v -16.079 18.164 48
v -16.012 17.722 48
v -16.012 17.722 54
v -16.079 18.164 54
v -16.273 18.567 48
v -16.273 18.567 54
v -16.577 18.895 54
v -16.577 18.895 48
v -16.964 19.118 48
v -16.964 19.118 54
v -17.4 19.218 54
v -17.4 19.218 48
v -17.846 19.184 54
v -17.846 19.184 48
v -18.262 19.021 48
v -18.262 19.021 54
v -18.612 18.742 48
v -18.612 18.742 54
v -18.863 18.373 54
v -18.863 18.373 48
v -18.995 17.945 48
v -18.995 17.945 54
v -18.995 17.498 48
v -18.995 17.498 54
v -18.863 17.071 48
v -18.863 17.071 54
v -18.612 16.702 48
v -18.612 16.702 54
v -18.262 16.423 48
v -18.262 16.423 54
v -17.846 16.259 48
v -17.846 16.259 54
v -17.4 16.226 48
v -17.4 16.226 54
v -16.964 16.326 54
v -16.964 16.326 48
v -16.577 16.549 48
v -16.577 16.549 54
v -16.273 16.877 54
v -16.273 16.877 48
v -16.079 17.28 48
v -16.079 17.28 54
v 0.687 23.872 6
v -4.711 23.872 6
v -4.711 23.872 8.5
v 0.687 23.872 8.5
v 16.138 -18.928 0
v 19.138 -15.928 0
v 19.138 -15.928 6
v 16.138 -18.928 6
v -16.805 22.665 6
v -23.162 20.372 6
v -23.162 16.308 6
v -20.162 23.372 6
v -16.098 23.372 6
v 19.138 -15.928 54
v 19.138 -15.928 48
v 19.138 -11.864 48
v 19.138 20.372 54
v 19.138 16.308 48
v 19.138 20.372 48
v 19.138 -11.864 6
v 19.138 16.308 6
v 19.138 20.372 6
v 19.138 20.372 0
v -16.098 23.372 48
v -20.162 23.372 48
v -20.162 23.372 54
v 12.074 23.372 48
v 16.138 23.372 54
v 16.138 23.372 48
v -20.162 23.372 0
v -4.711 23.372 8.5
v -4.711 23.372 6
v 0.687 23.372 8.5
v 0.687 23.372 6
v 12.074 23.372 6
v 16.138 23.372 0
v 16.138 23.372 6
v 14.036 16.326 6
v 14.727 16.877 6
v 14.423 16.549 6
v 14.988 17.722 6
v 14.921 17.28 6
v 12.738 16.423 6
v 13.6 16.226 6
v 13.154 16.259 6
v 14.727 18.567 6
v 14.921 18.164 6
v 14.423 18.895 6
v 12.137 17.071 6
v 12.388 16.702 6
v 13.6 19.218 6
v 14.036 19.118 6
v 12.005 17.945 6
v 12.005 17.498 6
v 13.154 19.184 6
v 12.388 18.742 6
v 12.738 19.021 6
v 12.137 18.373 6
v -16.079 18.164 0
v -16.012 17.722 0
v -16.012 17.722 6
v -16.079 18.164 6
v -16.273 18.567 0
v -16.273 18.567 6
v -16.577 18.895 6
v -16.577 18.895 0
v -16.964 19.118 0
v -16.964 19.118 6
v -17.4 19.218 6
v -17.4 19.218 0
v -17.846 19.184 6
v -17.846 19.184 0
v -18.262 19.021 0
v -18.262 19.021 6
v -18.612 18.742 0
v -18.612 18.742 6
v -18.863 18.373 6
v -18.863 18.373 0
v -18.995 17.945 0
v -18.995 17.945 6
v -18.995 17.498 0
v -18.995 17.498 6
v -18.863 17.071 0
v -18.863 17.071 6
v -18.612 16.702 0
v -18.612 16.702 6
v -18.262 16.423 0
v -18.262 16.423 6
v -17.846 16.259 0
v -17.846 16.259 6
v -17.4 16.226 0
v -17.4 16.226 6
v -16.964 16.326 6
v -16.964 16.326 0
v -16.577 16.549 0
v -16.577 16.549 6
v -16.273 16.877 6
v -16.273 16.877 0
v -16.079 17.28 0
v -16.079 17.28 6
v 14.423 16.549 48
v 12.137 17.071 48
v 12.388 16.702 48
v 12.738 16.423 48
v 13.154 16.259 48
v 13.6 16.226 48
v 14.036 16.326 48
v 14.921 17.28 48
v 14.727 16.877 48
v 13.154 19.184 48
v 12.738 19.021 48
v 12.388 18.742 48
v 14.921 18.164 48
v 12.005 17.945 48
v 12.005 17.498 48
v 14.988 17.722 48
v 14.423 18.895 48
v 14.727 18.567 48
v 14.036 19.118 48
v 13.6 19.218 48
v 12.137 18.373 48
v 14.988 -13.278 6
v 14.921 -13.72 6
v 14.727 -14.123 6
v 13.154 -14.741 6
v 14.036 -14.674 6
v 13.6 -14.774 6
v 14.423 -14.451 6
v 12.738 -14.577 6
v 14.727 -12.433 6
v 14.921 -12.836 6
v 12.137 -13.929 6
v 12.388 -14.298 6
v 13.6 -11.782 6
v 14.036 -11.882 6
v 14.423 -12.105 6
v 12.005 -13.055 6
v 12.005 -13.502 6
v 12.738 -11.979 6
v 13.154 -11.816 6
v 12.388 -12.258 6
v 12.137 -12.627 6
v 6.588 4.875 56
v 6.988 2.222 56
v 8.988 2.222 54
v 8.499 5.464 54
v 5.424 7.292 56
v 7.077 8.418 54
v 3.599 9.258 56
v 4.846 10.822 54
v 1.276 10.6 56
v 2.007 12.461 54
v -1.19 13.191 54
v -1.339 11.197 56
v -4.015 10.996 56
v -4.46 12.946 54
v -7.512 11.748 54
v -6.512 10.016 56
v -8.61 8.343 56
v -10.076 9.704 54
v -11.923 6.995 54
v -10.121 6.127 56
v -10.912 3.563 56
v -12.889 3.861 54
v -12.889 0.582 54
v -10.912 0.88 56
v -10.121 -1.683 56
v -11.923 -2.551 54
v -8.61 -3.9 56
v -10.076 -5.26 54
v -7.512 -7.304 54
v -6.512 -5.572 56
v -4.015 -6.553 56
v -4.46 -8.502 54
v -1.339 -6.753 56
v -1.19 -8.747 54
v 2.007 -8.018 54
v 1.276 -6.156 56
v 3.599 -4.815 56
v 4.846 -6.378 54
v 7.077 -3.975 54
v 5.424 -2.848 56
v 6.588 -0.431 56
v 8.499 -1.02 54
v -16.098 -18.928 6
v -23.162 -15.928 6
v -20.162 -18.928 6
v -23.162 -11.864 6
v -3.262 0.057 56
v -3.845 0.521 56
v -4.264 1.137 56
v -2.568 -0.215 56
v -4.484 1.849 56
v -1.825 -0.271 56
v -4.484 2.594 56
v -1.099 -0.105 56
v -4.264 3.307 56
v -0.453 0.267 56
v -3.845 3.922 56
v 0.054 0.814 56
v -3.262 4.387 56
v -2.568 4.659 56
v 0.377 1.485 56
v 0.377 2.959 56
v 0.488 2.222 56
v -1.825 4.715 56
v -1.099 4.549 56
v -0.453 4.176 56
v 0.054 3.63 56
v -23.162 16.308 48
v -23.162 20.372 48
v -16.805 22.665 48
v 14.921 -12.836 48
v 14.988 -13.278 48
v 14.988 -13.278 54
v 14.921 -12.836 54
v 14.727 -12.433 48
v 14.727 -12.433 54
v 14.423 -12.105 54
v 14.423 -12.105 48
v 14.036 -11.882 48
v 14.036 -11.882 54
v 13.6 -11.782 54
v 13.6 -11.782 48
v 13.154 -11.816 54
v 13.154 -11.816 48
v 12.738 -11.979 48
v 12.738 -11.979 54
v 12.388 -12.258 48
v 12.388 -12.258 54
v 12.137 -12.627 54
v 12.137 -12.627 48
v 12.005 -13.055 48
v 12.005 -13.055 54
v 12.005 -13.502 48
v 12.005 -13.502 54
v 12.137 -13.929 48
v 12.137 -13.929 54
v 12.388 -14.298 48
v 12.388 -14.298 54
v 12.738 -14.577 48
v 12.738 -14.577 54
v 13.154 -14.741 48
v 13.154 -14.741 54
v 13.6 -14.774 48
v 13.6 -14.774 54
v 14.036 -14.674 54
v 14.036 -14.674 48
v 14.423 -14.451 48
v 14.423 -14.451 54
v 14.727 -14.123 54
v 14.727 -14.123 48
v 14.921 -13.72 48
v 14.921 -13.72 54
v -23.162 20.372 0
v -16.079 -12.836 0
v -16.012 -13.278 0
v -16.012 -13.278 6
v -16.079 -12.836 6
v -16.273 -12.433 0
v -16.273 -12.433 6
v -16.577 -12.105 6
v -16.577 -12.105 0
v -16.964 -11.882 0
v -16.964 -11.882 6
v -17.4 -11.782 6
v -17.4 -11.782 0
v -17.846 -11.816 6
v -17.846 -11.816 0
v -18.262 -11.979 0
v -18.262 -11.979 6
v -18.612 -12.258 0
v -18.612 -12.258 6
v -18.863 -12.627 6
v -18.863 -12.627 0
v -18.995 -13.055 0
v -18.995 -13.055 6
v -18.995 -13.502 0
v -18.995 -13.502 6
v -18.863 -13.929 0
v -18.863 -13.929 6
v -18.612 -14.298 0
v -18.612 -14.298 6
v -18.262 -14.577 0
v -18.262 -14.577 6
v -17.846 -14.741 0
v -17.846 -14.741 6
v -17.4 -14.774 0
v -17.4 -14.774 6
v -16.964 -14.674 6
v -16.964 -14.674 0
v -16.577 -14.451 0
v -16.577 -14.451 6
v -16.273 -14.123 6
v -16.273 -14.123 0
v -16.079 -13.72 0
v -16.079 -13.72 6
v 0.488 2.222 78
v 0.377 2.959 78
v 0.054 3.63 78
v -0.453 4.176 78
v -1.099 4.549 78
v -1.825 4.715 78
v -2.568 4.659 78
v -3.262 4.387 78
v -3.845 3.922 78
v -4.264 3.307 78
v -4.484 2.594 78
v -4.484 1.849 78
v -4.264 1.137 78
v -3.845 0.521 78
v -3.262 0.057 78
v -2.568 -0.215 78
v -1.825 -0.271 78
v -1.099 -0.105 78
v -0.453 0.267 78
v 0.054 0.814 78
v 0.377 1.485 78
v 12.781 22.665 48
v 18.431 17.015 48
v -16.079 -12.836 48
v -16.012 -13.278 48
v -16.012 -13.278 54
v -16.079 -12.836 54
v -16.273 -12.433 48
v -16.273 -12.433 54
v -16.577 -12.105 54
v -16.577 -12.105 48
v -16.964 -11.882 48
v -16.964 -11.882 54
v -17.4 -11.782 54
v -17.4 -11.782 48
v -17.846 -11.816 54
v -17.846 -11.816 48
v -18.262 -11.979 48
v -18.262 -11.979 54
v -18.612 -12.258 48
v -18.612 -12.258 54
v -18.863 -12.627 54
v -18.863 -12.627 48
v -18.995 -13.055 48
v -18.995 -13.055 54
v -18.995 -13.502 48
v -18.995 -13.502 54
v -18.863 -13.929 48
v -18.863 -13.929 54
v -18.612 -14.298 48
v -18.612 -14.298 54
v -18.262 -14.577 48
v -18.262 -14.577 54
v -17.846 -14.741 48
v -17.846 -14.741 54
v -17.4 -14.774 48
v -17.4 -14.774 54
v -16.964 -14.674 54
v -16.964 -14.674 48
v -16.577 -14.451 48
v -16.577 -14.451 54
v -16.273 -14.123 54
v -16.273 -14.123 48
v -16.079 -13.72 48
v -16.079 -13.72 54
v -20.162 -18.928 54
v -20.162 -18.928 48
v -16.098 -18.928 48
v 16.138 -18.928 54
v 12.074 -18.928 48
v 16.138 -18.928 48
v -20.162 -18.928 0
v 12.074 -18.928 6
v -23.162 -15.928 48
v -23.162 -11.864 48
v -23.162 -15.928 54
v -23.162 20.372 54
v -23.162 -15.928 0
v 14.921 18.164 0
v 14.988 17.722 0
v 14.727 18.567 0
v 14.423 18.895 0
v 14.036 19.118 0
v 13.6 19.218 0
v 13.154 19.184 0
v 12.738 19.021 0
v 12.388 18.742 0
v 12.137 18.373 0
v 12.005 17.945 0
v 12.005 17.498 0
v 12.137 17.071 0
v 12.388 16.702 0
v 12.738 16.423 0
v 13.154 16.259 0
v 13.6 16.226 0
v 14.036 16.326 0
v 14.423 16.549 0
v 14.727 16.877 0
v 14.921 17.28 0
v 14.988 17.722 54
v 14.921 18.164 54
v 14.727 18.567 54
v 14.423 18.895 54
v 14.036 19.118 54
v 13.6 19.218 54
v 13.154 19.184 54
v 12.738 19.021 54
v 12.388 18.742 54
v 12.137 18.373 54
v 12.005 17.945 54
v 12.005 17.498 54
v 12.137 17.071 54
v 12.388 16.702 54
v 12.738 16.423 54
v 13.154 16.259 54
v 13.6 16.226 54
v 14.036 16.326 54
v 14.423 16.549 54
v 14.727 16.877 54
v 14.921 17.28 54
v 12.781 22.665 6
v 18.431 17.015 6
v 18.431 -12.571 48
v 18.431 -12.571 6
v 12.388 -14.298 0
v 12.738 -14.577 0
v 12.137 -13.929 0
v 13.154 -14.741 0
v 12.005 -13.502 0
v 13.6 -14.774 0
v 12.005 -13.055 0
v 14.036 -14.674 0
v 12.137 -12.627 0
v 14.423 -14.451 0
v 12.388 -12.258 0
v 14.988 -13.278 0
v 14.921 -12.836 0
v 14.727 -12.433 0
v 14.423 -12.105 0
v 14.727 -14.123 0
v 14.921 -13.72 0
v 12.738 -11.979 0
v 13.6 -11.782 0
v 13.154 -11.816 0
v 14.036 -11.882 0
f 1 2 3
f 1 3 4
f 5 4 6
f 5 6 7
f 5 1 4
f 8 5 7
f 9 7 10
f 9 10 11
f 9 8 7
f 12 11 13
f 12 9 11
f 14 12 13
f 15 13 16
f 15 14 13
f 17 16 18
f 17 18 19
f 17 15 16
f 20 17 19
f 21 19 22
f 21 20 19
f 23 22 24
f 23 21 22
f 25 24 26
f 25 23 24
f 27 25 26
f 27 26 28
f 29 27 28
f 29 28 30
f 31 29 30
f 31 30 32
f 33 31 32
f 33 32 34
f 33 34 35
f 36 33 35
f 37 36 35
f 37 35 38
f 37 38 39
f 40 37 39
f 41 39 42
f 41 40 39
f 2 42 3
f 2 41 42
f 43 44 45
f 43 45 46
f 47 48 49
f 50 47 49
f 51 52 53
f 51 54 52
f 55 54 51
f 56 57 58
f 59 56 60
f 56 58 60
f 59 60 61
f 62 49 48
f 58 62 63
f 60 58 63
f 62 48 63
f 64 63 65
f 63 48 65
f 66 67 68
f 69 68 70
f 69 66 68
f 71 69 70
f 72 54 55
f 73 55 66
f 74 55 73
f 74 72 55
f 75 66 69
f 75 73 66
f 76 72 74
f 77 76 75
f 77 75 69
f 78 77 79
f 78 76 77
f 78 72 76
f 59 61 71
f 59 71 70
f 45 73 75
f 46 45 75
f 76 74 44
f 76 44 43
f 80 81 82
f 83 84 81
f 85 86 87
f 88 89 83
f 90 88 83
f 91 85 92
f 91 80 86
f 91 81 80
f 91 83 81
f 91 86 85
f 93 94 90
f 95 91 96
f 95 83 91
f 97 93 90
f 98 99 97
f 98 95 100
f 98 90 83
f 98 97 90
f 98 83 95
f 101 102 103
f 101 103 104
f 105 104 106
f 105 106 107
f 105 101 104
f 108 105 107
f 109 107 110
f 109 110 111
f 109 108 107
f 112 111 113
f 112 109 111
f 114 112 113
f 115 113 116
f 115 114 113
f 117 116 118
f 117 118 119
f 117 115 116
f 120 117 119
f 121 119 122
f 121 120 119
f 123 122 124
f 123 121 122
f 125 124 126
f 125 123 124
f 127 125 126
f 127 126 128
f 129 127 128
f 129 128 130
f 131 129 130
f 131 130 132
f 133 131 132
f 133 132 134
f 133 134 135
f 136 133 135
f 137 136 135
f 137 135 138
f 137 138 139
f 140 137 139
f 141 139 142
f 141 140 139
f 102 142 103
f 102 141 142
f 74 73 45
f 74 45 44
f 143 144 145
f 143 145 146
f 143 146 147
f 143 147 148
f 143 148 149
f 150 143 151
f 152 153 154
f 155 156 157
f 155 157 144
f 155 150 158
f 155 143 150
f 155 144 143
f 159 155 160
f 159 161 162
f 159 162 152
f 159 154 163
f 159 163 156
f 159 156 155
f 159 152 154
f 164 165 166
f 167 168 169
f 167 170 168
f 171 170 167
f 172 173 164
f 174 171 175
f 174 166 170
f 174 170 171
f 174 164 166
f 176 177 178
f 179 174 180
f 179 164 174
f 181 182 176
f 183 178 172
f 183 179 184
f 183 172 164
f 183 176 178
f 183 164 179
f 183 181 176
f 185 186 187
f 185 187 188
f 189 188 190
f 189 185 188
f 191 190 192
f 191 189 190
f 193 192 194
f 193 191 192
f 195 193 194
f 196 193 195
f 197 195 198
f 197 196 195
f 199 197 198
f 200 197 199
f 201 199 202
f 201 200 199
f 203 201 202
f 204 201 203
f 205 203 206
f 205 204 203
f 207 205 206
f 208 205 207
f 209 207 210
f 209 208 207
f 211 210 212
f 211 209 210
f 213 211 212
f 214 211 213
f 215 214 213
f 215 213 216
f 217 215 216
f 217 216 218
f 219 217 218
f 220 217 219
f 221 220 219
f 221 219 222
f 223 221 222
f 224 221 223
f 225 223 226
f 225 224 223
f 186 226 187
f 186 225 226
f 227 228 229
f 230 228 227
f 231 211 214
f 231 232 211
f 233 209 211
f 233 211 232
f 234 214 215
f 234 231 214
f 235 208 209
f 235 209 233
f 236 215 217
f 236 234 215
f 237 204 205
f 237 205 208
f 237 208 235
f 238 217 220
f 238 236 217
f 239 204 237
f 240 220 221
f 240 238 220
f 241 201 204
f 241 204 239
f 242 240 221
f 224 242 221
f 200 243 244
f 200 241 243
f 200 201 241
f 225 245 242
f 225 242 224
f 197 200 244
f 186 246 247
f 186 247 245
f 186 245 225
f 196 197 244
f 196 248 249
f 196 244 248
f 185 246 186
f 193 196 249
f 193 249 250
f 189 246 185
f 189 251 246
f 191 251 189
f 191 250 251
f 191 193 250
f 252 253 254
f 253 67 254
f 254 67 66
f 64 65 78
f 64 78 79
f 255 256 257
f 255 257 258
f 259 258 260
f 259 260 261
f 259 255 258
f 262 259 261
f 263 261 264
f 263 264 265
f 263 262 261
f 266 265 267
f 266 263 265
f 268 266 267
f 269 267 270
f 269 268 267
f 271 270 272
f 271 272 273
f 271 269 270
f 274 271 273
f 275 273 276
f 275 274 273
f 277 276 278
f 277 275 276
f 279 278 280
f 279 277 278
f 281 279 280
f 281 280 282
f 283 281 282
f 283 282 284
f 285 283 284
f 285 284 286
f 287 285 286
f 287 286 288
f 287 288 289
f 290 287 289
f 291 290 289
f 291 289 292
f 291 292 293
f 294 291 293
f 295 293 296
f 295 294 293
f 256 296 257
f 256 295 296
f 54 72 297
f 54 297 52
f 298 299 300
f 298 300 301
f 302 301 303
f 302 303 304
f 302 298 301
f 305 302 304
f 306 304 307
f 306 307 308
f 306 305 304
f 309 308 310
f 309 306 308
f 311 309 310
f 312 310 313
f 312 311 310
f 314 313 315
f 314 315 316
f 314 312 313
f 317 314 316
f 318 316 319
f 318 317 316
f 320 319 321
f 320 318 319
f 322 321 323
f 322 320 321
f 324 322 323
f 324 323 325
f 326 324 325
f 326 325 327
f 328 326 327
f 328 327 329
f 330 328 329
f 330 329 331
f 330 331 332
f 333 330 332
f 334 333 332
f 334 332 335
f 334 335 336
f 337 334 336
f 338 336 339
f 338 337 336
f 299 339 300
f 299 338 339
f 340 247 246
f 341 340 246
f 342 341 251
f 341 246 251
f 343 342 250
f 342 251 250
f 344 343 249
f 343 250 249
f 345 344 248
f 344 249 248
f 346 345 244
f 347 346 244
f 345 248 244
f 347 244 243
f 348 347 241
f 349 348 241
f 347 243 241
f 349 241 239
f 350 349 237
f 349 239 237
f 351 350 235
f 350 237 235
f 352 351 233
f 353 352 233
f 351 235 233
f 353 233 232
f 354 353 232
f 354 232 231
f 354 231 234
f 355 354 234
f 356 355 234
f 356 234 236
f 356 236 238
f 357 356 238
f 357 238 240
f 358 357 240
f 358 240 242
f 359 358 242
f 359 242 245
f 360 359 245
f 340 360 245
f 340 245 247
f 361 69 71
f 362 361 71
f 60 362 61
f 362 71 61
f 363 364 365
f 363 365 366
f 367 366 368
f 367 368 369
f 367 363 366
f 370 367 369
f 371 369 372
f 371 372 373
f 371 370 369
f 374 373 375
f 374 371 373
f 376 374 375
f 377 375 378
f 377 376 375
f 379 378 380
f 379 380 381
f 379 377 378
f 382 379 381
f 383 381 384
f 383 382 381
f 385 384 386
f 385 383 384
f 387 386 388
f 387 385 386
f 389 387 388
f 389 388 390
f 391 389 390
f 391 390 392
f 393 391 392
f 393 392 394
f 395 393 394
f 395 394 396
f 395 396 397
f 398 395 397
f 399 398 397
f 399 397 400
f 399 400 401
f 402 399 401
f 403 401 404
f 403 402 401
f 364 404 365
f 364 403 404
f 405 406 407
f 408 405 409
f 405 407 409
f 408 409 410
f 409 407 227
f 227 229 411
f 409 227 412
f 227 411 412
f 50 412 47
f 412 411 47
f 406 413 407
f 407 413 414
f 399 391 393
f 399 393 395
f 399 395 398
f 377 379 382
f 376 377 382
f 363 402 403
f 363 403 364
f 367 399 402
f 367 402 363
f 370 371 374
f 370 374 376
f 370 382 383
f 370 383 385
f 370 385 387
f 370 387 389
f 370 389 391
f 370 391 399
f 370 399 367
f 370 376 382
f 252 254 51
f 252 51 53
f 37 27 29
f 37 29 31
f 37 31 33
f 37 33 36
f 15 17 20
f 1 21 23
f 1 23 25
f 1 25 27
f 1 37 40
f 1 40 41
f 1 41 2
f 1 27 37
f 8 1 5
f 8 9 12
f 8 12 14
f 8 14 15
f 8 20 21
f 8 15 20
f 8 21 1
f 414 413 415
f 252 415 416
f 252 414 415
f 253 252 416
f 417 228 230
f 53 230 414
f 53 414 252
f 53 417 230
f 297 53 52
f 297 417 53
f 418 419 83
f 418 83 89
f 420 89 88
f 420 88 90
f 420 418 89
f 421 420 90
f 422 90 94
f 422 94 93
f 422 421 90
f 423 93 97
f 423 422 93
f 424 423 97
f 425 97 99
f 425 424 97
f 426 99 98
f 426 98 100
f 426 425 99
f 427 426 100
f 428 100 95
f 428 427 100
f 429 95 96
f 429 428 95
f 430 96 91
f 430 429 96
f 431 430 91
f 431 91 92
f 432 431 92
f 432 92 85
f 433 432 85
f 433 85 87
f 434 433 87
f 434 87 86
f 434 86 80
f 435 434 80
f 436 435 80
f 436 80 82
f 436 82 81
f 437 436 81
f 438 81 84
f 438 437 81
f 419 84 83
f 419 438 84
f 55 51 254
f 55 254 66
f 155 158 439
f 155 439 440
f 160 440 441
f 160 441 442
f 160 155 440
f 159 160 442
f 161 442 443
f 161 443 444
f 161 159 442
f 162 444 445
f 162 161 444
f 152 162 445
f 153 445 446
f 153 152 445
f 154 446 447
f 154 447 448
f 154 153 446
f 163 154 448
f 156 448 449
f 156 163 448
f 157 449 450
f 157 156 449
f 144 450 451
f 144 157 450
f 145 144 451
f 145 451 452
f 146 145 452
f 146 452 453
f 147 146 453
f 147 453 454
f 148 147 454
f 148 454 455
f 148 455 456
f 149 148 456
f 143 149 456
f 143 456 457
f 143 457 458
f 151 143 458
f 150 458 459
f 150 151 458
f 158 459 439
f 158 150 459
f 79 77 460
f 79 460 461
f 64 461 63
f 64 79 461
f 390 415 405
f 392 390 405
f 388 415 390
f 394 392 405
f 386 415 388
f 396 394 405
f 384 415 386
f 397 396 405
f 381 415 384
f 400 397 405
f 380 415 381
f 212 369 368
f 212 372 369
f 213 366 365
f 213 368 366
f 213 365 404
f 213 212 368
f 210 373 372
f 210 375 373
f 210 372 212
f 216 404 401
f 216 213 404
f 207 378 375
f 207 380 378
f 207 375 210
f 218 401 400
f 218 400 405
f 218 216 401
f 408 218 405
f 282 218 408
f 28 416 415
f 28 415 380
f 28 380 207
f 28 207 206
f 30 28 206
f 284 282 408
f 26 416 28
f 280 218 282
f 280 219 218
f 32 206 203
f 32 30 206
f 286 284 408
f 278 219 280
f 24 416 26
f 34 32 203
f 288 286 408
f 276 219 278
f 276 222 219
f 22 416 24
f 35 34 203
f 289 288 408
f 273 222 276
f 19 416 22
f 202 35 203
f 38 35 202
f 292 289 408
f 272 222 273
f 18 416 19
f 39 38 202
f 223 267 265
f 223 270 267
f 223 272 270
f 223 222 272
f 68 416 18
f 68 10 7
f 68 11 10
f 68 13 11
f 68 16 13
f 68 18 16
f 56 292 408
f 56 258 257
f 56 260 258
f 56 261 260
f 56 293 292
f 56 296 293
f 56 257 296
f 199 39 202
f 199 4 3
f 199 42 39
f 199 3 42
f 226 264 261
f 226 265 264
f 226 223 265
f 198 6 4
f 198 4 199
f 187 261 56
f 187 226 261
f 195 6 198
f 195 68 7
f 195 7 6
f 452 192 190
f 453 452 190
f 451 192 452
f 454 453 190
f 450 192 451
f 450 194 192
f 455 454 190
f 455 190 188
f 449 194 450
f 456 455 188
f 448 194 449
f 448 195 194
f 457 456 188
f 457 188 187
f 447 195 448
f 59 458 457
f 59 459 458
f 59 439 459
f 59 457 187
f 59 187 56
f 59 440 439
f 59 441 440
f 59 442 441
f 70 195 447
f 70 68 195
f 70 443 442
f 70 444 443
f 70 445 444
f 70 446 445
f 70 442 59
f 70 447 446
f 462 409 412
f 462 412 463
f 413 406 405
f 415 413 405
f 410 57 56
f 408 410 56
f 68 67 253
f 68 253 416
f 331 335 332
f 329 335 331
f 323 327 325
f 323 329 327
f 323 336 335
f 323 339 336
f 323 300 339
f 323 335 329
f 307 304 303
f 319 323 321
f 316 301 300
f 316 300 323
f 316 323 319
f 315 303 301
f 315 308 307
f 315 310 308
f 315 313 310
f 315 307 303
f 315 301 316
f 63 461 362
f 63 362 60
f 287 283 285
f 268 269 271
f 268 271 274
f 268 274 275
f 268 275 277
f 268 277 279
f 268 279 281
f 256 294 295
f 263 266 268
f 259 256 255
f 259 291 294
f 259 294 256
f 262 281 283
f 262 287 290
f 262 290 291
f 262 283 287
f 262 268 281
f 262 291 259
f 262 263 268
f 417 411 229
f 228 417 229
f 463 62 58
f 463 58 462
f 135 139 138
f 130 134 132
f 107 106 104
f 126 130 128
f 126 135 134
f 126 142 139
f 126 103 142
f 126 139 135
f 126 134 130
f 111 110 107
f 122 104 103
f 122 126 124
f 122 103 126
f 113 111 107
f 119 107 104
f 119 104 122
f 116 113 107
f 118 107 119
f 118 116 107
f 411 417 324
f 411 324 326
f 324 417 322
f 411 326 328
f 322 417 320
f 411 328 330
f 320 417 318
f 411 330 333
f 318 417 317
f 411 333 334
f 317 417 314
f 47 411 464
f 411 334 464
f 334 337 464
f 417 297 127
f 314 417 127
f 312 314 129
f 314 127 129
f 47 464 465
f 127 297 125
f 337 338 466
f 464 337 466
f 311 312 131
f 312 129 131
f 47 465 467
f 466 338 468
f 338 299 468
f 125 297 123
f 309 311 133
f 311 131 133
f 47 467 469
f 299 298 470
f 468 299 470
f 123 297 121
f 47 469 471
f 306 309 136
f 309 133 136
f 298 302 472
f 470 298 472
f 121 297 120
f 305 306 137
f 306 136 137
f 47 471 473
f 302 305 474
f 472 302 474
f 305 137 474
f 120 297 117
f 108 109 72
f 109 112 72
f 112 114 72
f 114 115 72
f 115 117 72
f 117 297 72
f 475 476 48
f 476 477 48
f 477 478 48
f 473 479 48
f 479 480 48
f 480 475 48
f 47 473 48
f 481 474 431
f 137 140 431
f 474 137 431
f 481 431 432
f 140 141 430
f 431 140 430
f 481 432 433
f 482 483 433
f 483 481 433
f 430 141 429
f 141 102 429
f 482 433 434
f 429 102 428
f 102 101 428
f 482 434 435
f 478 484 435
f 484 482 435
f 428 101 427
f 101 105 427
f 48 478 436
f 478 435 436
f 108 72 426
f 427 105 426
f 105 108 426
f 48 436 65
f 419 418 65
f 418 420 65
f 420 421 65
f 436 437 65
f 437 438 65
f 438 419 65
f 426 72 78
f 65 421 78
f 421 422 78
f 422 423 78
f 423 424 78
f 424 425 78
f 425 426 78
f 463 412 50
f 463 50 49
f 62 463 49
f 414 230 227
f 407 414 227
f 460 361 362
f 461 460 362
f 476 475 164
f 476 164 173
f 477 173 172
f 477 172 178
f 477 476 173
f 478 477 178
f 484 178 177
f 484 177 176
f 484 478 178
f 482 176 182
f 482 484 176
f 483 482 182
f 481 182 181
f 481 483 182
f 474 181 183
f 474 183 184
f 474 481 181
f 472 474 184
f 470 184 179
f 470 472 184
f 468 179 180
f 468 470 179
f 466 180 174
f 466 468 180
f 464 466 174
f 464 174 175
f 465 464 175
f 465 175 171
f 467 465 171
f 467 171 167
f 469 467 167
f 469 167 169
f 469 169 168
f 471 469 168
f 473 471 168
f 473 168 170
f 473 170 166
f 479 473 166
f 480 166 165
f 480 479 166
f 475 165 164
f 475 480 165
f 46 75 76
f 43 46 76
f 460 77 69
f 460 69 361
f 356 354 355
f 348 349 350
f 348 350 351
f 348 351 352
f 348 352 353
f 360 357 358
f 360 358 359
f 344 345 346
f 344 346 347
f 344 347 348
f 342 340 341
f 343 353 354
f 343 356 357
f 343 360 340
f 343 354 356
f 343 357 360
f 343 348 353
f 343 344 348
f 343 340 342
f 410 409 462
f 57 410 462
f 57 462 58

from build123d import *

# Parameters (mm, degrees)
SKETCH_1_W          = 42.3
SKETCH_1_H          = 42.3
SKETCH_1_R          = 1.5
EXTRUDE_1_DEPTH     = 6
EXTRUDE_2_DEPTH     = 42
SKETCH_3_W          = 42.3
SKETCH_3_H          = 42.3
EXTRUDE_3_DEPTH     = 6
SKETCH_4_R          = 2.5
EXTRUDE_4_DEPTH     = 24
SKETCH_4_3_R        = 11
SKETCH_4_3_R_2      = 2.5
EXTRUDE_5_DEPTH     = 2
CHAMFER_1_SIZE      = 3
CUT_EXTRUDE_START   = -6
SKETCH_5_R          = 1.5
CUT_EXTRUDE_1_DEPTH = 6
SKETCH_6_W          = 5.398834963
SKETCH_6_H          = 2.5
EXTRUDE_6_DEPTH     = 0.5
CHAMFER_2_SIZE      = 2


with BuildPart() as part:
    # 草图1 → 凸台-拉伸1 (new body)
    with BuildSketch(Plane.XY):
        with Locations((-2.012033722, 2.221867738)):
            Rectangle(SKETCH_1_W, SKETCH_1_H)
        with Locations((-17.512033722, 17.721867738)):
            Circle(SKETCH_1_R, mode=Mode.SUBTRACT)
        with Locations((13.487966278, 17.721867738)):
            Circle(SKETCH_1_R, mode=Mode.SUBTRACT)
        with Locations((-17.512033722, -13.278132262)):
            Circle(SKETCH_1_R, mode=Mode.SUBTRACT)
        with Locations((13.487966278, -13.278132262)):
            Circle(SKETCH_1_R, mode=Mode.SUBTRACT)
    extrude(amount=EXTRUDE_1_DEPTH)

    # 草图2 → 凸台-拉伸2 (add)
    with BuildSketch(Plane.XY.offset(6)):
        Polygon((-16.804926941, -18.221025481), (-22.454926941, -12.571025481), (-23.162033722, -11.8639187), (-23.162033722, 16.307654175), (-22.454926941, 17.014760956), (-16.804926941, 22.664760956), (-16.09782016, 23.371867738), (12.073752715, 23.371867738), (12.780859496, 22.664760956), (18.430859496, 17.014760956), (19.137966278, 16.307654175), (19.137966278, -11.8639187), (18.430859496, -12.571025481), (12.780859496, -18.221025481), (12.073752715, -18.928132262), (-16.09782016, -18.928132262), align=None)
    extrude(amount=EXTRUDE_2_DEPTH)

    # 草图3 → 凸台-拉伸3 (add)
    with BuildSketch(Plane.XY.offset(48)):
        with Locations((-2.012033722, 2.221867738)):
            Rectangle(SKETCH_3_W, SKETCH_3_H)
    extrude(amount=EXTRUDE_3_DEPTH)

    # 草图4 → 凸台-拉伸4 (add)
    with BuildSketch(Plane.XY.offset(54)):
        with Locations((-2.012033722, 2.221867738)):
            Circle(SKETCH_4_R)
    extrude(amount=EXTRUDE_4_DEPTH)

    # 草图4<3> → 凸台-拉伸5 (add)
    with BuildSketch(Plane.XY.offset(54)):
        with Locations((-2.012033722, 2.221867738)):
            Circle(SKETCH_4_3_R)
        with Locations((-2.012033722, 2.221867738)):
            Circle(SKETCH_4_3_R_2, mode=Mode.SUBTRACT)
    extrude(amount=EXTRUDE_5_DEPTH)

    # 倒角1
    chamfer_1_edges = [part.edges().sort_by_distance(p)[0] for p in [
        (-23.162033722, -18.928132262, 51),
        (-23.162033722, -18.928132262, 3),
        (19.137966278, -18.928132262, 51),
        (19.137966278, -18.928132262, 3),
        (19.137966278, 23.371867738, 51),
        (19.137966278, 23.371867738, 3),
        (-23.162033722, 23.371867738, 51),
        (-23.162033722, 23.371867738, 3),
    ]]
    chamfer(chamfer_1_edges, length=CHAMFER_1_SIZE)

    # 草图5 → 切除-拉伸1 (cut)
    with BuildSketch(Plane.XY.offset(54).offset(CUT_EXTRUDE_START)):
        with Locations((-17.512033722, 17.721867738)):
            Circle(SKETCH_5_R)
        with Locations((13.487966278, 17.721867738)):
            Circle(SKETCH_5_R)
        with Locations((13.487966278, -13.278132262)):
            Circle(SKETCH_5_R)
        with Locations((-17.512033722, -13.278132262)):
            Circle(SKETCH_5_R)
    extrude(amount=CUT_EXTRUDE_1_DEPTH, mode=Mode.SUBTRACT)

    # 草图6 → 凸台-拉伸6 (add)
    with BuildSketch(Plane(origin=(0, 23.371867738, 0), x_dir=(1, 0, 0), z_dir=(0, 1, 0))):
        with Locations((-2.012033723, -7.25)):
            Rectangle(SKETCH_6_W, SKETCH_6_H)
    extrude(amount=EXTRUDE_6_DEPTH)

    # 倒角2
    chamfer_2_edges = [part.edges().sort_by_distance(p)[0] for p in [
        (-13.012033722, 2.221867738, 56),
    ]]
    chamfer(chamfer_2_edges, length=CHAMFER_2_SIZE - 0.0001)  # a hair under: the kernel refuses the full size


solid = part.part
